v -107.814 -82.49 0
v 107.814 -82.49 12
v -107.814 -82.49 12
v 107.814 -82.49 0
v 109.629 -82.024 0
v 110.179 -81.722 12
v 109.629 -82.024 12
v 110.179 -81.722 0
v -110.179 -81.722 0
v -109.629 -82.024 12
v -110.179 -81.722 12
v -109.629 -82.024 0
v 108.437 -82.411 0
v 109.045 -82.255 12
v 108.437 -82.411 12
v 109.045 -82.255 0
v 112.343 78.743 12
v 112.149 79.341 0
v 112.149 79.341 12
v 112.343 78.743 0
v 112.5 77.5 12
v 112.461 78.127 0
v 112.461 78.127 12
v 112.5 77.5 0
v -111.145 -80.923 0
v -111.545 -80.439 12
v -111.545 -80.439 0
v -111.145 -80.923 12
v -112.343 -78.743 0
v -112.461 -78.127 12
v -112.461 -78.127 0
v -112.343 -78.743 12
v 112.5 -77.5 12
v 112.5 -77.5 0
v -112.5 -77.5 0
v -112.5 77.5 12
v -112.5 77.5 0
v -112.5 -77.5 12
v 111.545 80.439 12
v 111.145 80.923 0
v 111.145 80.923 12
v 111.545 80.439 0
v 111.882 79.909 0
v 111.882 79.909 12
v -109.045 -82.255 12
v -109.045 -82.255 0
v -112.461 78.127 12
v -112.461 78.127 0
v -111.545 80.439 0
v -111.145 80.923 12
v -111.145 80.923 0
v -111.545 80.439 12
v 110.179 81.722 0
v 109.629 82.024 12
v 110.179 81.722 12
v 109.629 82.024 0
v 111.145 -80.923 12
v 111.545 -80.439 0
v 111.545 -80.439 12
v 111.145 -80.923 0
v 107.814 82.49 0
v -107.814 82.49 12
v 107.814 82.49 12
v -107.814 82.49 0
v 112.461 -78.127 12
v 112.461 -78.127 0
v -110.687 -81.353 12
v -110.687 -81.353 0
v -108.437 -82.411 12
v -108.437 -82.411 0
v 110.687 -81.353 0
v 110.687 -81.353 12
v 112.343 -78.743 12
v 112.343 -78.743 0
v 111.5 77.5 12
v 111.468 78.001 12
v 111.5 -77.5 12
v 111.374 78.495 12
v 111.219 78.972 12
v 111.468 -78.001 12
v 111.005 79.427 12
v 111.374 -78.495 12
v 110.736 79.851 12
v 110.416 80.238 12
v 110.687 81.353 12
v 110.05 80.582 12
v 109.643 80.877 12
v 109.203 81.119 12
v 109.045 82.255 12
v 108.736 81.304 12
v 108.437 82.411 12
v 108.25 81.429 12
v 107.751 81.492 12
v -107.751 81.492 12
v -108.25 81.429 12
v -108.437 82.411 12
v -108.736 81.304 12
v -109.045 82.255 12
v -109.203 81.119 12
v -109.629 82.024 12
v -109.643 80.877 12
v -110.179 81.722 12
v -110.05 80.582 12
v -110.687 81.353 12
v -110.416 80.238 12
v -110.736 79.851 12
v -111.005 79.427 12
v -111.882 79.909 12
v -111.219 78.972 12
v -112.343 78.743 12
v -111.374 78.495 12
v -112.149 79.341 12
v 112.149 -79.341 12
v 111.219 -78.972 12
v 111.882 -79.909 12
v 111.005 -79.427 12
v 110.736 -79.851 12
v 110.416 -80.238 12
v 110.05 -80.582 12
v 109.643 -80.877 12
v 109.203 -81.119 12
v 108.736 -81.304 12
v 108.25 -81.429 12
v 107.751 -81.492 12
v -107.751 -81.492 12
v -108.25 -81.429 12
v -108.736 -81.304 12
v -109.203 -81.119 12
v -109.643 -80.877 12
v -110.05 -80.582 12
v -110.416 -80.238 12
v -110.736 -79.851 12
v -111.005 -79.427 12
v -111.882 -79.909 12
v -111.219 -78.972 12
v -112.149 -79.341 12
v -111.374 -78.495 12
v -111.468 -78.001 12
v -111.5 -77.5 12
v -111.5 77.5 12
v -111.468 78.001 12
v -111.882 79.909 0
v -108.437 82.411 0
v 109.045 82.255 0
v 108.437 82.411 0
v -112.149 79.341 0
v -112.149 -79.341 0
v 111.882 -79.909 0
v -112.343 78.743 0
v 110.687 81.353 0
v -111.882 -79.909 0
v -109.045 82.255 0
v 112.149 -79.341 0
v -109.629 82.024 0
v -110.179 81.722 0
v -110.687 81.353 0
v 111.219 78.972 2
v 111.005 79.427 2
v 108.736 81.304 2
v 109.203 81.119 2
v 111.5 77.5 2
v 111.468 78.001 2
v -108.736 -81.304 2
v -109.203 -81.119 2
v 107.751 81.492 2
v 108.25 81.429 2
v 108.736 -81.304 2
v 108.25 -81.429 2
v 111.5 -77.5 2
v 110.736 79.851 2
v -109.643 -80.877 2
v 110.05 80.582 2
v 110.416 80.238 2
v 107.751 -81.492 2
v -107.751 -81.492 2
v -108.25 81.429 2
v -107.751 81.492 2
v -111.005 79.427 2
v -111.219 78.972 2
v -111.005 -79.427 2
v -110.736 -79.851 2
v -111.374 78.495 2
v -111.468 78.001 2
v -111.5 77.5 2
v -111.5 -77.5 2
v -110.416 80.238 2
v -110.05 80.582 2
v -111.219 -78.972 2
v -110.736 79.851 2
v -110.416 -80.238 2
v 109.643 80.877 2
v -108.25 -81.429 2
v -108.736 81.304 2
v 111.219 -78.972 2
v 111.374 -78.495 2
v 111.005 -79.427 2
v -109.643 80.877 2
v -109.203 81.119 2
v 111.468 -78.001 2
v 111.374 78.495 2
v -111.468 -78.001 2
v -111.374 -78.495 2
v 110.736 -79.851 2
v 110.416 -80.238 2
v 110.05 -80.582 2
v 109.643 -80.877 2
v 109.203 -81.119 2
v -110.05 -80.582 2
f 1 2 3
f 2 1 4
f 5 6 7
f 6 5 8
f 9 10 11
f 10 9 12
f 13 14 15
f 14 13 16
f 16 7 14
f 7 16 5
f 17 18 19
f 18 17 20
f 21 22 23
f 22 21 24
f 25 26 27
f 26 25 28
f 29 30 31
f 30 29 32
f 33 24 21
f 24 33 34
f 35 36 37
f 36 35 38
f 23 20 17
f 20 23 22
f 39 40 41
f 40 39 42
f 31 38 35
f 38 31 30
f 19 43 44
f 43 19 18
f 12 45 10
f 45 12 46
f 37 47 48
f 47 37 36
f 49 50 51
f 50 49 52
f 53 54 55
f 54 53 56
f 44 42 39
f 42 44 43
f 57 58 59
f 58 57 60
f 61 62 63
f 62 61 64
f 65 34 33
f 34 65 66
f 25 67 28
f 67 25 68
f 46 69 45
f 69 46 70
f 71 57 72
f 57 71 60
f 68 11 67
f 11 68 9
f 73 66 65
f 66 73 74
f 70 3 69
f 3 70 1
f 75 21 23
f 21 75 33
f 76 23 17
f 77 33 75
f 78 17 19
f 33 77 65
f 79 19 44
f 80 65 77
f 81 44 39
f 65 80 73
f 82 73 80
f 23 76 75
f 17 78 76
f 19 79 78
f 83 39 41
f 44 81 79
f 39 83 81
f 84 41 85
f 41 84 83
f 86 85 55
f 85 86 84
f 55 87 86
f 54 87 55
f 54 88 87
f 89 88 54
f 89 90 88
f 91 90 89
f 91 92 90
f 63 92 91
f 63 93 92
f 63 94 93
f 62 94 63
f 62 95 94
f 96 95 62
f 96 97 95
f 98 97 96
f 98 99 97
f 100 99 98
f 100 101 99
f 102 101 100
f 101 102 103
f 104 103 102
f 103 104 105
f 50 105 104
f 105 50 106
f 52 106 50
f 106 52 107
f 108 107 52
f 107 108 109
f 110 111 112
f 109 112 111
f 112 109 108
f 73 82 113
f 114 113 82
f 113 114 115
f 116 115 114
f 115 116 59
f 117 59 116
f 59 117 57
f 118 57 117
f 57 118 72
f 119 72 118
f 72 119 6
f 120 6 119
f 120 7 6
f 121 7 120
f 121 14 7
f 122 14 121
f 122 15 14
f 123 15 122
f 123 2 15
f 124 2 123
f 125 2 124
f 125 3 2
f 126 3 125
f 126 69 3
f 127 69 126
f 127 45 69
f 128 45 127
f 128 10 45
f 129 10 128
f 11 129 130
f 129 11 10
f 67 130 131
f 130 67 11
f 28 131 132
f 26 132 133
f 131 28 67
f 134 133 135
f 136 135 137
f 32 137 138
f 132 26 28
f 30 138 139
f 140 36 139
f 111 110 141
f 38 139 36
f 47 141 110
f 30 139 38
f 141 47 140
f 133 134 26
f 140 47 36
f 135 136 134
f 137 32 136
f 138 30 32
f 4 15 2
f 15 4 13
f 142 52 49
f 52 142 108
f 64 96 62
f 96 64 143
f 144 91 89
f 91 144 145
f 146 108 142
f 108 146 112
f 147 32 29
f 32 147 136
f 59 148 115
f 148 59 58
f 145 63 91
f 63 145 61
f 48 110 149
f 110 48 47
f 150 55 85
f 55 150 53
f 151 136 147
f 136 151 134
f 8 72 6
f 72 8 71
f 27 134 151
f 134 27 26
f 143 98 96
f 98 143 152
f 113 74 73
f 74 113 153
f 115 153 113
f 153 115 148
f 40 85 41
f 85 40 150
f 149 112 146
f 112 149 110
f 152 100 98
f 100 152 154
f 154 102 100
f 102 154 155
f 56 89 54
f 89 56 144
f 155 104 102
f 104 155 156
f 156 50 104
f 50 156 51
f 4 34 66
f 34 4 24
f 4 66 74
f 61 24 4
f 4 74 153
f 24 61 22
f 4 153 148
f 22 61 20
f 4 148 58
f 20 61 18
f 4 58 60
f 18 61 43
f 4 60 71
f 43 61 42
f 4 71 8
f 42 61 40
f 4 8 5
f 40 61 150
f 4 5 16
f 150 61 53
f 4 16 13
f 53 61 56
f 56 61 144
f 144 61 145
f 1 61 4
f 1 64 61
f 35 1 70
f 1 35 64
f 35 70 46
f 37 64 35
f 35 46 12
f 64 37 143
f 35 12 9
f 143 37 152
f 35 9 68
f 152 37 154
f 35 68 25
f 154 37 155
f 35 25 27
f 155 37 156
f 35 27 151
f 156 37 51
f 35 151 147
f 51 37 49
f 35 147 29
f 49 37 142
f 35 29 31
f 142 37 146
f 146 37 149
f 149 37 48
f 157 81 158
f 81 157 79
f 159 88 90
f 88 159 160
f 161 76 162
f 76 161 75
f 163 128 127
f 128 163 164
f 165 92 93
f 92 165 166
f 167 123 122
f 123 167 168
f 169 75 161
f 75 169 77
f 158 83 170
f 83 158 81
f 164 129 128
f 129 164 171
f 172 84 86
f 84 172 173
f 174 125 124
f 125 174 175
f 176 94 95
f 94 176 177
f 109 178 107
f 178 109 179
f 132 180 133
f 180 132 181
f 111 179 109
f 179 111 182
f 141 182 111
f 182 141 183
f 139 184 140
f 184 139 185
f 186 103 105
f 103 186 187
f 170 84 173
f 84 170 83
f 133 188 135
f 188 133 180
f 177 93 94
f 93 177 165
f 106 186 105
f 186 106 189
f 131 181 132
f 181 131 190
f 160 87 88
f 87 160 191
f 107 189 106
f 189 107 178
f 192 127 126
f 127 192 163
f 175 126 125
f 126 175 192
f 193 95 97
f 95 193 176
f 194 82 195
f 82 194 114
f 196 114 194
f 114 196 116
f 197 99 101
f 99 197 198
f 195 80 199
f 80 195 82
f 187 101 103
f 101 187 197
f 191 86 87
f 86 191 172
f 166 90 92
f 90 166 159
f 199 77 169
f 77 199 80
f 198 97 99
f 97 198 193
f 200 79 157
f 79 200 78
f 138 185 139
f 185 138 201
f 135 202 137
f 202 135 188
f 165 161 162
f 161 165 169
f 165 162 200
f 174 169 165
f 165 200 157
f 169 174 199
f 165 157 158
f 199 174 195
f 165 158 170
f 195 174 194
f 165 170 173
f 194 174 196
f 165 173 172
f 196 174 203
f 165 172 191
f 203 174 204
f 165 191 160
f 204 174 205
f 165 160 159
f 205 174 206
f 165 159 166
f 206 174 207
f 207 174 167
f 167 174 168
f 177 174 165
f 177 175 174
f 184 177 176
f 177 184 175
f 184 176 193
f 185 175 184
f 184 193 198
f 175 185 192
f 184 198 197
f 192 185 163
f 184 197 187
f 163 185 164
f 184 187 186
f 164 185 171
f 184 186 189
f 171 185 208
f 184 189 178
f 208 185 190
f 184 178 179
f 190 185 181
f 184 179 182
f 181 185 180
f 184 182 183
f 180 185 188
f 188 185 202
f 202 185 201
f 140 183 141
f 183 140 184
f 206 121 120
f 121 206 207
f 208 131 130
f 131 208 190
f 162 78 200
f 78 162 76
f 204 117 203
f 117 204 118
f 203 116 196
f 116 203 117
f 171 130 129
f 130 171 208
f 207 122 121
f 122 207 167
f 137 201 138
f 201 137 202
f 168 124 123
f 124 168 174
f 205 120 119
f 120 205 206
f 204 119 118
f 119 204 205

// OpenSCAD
$fn = 50;


difference() {
	union() {
		hull() {
			translate(v = [-107.5000000000, 77.5000000000, 0]) {
				cylinder(h = 12, r = 5);
			}
			translate(v = [107.5000000000, 77.5000000000, 0]) {
				cylinder(h = 12, r = 5);
			}
			translate(v = [-107.5000000000, -77.5000000000, 0]) {
				cylinder(h = 12, r = 5);
			}
			translate(v = [107.5000000000, -77.5000000000, 0]) {
				cylinder(h = 12, r = 5);
			}
		}
	}
	union() {
		translate(v = [0, 0, 2]) {
			hull() {
				translate(v = [-107.5000000000, 77.5000000000, 0]) {
					cylinder(h = 10, r = 4);
				}
				translate(v = [107.5000000000, 77.5000000000, 0]) {
					cylinder(h = 10, r = 4);
				}
				translate(v = [-107.5000000000, -77.5000000000, 0]) {
					cylinder(h = 10, r = 4);
				}
				translate(v = [107.5000000000, -77.5000000000, 0]) {
					cylinder(h = 10, r = 4);
				}
			}
		}
	}
}
